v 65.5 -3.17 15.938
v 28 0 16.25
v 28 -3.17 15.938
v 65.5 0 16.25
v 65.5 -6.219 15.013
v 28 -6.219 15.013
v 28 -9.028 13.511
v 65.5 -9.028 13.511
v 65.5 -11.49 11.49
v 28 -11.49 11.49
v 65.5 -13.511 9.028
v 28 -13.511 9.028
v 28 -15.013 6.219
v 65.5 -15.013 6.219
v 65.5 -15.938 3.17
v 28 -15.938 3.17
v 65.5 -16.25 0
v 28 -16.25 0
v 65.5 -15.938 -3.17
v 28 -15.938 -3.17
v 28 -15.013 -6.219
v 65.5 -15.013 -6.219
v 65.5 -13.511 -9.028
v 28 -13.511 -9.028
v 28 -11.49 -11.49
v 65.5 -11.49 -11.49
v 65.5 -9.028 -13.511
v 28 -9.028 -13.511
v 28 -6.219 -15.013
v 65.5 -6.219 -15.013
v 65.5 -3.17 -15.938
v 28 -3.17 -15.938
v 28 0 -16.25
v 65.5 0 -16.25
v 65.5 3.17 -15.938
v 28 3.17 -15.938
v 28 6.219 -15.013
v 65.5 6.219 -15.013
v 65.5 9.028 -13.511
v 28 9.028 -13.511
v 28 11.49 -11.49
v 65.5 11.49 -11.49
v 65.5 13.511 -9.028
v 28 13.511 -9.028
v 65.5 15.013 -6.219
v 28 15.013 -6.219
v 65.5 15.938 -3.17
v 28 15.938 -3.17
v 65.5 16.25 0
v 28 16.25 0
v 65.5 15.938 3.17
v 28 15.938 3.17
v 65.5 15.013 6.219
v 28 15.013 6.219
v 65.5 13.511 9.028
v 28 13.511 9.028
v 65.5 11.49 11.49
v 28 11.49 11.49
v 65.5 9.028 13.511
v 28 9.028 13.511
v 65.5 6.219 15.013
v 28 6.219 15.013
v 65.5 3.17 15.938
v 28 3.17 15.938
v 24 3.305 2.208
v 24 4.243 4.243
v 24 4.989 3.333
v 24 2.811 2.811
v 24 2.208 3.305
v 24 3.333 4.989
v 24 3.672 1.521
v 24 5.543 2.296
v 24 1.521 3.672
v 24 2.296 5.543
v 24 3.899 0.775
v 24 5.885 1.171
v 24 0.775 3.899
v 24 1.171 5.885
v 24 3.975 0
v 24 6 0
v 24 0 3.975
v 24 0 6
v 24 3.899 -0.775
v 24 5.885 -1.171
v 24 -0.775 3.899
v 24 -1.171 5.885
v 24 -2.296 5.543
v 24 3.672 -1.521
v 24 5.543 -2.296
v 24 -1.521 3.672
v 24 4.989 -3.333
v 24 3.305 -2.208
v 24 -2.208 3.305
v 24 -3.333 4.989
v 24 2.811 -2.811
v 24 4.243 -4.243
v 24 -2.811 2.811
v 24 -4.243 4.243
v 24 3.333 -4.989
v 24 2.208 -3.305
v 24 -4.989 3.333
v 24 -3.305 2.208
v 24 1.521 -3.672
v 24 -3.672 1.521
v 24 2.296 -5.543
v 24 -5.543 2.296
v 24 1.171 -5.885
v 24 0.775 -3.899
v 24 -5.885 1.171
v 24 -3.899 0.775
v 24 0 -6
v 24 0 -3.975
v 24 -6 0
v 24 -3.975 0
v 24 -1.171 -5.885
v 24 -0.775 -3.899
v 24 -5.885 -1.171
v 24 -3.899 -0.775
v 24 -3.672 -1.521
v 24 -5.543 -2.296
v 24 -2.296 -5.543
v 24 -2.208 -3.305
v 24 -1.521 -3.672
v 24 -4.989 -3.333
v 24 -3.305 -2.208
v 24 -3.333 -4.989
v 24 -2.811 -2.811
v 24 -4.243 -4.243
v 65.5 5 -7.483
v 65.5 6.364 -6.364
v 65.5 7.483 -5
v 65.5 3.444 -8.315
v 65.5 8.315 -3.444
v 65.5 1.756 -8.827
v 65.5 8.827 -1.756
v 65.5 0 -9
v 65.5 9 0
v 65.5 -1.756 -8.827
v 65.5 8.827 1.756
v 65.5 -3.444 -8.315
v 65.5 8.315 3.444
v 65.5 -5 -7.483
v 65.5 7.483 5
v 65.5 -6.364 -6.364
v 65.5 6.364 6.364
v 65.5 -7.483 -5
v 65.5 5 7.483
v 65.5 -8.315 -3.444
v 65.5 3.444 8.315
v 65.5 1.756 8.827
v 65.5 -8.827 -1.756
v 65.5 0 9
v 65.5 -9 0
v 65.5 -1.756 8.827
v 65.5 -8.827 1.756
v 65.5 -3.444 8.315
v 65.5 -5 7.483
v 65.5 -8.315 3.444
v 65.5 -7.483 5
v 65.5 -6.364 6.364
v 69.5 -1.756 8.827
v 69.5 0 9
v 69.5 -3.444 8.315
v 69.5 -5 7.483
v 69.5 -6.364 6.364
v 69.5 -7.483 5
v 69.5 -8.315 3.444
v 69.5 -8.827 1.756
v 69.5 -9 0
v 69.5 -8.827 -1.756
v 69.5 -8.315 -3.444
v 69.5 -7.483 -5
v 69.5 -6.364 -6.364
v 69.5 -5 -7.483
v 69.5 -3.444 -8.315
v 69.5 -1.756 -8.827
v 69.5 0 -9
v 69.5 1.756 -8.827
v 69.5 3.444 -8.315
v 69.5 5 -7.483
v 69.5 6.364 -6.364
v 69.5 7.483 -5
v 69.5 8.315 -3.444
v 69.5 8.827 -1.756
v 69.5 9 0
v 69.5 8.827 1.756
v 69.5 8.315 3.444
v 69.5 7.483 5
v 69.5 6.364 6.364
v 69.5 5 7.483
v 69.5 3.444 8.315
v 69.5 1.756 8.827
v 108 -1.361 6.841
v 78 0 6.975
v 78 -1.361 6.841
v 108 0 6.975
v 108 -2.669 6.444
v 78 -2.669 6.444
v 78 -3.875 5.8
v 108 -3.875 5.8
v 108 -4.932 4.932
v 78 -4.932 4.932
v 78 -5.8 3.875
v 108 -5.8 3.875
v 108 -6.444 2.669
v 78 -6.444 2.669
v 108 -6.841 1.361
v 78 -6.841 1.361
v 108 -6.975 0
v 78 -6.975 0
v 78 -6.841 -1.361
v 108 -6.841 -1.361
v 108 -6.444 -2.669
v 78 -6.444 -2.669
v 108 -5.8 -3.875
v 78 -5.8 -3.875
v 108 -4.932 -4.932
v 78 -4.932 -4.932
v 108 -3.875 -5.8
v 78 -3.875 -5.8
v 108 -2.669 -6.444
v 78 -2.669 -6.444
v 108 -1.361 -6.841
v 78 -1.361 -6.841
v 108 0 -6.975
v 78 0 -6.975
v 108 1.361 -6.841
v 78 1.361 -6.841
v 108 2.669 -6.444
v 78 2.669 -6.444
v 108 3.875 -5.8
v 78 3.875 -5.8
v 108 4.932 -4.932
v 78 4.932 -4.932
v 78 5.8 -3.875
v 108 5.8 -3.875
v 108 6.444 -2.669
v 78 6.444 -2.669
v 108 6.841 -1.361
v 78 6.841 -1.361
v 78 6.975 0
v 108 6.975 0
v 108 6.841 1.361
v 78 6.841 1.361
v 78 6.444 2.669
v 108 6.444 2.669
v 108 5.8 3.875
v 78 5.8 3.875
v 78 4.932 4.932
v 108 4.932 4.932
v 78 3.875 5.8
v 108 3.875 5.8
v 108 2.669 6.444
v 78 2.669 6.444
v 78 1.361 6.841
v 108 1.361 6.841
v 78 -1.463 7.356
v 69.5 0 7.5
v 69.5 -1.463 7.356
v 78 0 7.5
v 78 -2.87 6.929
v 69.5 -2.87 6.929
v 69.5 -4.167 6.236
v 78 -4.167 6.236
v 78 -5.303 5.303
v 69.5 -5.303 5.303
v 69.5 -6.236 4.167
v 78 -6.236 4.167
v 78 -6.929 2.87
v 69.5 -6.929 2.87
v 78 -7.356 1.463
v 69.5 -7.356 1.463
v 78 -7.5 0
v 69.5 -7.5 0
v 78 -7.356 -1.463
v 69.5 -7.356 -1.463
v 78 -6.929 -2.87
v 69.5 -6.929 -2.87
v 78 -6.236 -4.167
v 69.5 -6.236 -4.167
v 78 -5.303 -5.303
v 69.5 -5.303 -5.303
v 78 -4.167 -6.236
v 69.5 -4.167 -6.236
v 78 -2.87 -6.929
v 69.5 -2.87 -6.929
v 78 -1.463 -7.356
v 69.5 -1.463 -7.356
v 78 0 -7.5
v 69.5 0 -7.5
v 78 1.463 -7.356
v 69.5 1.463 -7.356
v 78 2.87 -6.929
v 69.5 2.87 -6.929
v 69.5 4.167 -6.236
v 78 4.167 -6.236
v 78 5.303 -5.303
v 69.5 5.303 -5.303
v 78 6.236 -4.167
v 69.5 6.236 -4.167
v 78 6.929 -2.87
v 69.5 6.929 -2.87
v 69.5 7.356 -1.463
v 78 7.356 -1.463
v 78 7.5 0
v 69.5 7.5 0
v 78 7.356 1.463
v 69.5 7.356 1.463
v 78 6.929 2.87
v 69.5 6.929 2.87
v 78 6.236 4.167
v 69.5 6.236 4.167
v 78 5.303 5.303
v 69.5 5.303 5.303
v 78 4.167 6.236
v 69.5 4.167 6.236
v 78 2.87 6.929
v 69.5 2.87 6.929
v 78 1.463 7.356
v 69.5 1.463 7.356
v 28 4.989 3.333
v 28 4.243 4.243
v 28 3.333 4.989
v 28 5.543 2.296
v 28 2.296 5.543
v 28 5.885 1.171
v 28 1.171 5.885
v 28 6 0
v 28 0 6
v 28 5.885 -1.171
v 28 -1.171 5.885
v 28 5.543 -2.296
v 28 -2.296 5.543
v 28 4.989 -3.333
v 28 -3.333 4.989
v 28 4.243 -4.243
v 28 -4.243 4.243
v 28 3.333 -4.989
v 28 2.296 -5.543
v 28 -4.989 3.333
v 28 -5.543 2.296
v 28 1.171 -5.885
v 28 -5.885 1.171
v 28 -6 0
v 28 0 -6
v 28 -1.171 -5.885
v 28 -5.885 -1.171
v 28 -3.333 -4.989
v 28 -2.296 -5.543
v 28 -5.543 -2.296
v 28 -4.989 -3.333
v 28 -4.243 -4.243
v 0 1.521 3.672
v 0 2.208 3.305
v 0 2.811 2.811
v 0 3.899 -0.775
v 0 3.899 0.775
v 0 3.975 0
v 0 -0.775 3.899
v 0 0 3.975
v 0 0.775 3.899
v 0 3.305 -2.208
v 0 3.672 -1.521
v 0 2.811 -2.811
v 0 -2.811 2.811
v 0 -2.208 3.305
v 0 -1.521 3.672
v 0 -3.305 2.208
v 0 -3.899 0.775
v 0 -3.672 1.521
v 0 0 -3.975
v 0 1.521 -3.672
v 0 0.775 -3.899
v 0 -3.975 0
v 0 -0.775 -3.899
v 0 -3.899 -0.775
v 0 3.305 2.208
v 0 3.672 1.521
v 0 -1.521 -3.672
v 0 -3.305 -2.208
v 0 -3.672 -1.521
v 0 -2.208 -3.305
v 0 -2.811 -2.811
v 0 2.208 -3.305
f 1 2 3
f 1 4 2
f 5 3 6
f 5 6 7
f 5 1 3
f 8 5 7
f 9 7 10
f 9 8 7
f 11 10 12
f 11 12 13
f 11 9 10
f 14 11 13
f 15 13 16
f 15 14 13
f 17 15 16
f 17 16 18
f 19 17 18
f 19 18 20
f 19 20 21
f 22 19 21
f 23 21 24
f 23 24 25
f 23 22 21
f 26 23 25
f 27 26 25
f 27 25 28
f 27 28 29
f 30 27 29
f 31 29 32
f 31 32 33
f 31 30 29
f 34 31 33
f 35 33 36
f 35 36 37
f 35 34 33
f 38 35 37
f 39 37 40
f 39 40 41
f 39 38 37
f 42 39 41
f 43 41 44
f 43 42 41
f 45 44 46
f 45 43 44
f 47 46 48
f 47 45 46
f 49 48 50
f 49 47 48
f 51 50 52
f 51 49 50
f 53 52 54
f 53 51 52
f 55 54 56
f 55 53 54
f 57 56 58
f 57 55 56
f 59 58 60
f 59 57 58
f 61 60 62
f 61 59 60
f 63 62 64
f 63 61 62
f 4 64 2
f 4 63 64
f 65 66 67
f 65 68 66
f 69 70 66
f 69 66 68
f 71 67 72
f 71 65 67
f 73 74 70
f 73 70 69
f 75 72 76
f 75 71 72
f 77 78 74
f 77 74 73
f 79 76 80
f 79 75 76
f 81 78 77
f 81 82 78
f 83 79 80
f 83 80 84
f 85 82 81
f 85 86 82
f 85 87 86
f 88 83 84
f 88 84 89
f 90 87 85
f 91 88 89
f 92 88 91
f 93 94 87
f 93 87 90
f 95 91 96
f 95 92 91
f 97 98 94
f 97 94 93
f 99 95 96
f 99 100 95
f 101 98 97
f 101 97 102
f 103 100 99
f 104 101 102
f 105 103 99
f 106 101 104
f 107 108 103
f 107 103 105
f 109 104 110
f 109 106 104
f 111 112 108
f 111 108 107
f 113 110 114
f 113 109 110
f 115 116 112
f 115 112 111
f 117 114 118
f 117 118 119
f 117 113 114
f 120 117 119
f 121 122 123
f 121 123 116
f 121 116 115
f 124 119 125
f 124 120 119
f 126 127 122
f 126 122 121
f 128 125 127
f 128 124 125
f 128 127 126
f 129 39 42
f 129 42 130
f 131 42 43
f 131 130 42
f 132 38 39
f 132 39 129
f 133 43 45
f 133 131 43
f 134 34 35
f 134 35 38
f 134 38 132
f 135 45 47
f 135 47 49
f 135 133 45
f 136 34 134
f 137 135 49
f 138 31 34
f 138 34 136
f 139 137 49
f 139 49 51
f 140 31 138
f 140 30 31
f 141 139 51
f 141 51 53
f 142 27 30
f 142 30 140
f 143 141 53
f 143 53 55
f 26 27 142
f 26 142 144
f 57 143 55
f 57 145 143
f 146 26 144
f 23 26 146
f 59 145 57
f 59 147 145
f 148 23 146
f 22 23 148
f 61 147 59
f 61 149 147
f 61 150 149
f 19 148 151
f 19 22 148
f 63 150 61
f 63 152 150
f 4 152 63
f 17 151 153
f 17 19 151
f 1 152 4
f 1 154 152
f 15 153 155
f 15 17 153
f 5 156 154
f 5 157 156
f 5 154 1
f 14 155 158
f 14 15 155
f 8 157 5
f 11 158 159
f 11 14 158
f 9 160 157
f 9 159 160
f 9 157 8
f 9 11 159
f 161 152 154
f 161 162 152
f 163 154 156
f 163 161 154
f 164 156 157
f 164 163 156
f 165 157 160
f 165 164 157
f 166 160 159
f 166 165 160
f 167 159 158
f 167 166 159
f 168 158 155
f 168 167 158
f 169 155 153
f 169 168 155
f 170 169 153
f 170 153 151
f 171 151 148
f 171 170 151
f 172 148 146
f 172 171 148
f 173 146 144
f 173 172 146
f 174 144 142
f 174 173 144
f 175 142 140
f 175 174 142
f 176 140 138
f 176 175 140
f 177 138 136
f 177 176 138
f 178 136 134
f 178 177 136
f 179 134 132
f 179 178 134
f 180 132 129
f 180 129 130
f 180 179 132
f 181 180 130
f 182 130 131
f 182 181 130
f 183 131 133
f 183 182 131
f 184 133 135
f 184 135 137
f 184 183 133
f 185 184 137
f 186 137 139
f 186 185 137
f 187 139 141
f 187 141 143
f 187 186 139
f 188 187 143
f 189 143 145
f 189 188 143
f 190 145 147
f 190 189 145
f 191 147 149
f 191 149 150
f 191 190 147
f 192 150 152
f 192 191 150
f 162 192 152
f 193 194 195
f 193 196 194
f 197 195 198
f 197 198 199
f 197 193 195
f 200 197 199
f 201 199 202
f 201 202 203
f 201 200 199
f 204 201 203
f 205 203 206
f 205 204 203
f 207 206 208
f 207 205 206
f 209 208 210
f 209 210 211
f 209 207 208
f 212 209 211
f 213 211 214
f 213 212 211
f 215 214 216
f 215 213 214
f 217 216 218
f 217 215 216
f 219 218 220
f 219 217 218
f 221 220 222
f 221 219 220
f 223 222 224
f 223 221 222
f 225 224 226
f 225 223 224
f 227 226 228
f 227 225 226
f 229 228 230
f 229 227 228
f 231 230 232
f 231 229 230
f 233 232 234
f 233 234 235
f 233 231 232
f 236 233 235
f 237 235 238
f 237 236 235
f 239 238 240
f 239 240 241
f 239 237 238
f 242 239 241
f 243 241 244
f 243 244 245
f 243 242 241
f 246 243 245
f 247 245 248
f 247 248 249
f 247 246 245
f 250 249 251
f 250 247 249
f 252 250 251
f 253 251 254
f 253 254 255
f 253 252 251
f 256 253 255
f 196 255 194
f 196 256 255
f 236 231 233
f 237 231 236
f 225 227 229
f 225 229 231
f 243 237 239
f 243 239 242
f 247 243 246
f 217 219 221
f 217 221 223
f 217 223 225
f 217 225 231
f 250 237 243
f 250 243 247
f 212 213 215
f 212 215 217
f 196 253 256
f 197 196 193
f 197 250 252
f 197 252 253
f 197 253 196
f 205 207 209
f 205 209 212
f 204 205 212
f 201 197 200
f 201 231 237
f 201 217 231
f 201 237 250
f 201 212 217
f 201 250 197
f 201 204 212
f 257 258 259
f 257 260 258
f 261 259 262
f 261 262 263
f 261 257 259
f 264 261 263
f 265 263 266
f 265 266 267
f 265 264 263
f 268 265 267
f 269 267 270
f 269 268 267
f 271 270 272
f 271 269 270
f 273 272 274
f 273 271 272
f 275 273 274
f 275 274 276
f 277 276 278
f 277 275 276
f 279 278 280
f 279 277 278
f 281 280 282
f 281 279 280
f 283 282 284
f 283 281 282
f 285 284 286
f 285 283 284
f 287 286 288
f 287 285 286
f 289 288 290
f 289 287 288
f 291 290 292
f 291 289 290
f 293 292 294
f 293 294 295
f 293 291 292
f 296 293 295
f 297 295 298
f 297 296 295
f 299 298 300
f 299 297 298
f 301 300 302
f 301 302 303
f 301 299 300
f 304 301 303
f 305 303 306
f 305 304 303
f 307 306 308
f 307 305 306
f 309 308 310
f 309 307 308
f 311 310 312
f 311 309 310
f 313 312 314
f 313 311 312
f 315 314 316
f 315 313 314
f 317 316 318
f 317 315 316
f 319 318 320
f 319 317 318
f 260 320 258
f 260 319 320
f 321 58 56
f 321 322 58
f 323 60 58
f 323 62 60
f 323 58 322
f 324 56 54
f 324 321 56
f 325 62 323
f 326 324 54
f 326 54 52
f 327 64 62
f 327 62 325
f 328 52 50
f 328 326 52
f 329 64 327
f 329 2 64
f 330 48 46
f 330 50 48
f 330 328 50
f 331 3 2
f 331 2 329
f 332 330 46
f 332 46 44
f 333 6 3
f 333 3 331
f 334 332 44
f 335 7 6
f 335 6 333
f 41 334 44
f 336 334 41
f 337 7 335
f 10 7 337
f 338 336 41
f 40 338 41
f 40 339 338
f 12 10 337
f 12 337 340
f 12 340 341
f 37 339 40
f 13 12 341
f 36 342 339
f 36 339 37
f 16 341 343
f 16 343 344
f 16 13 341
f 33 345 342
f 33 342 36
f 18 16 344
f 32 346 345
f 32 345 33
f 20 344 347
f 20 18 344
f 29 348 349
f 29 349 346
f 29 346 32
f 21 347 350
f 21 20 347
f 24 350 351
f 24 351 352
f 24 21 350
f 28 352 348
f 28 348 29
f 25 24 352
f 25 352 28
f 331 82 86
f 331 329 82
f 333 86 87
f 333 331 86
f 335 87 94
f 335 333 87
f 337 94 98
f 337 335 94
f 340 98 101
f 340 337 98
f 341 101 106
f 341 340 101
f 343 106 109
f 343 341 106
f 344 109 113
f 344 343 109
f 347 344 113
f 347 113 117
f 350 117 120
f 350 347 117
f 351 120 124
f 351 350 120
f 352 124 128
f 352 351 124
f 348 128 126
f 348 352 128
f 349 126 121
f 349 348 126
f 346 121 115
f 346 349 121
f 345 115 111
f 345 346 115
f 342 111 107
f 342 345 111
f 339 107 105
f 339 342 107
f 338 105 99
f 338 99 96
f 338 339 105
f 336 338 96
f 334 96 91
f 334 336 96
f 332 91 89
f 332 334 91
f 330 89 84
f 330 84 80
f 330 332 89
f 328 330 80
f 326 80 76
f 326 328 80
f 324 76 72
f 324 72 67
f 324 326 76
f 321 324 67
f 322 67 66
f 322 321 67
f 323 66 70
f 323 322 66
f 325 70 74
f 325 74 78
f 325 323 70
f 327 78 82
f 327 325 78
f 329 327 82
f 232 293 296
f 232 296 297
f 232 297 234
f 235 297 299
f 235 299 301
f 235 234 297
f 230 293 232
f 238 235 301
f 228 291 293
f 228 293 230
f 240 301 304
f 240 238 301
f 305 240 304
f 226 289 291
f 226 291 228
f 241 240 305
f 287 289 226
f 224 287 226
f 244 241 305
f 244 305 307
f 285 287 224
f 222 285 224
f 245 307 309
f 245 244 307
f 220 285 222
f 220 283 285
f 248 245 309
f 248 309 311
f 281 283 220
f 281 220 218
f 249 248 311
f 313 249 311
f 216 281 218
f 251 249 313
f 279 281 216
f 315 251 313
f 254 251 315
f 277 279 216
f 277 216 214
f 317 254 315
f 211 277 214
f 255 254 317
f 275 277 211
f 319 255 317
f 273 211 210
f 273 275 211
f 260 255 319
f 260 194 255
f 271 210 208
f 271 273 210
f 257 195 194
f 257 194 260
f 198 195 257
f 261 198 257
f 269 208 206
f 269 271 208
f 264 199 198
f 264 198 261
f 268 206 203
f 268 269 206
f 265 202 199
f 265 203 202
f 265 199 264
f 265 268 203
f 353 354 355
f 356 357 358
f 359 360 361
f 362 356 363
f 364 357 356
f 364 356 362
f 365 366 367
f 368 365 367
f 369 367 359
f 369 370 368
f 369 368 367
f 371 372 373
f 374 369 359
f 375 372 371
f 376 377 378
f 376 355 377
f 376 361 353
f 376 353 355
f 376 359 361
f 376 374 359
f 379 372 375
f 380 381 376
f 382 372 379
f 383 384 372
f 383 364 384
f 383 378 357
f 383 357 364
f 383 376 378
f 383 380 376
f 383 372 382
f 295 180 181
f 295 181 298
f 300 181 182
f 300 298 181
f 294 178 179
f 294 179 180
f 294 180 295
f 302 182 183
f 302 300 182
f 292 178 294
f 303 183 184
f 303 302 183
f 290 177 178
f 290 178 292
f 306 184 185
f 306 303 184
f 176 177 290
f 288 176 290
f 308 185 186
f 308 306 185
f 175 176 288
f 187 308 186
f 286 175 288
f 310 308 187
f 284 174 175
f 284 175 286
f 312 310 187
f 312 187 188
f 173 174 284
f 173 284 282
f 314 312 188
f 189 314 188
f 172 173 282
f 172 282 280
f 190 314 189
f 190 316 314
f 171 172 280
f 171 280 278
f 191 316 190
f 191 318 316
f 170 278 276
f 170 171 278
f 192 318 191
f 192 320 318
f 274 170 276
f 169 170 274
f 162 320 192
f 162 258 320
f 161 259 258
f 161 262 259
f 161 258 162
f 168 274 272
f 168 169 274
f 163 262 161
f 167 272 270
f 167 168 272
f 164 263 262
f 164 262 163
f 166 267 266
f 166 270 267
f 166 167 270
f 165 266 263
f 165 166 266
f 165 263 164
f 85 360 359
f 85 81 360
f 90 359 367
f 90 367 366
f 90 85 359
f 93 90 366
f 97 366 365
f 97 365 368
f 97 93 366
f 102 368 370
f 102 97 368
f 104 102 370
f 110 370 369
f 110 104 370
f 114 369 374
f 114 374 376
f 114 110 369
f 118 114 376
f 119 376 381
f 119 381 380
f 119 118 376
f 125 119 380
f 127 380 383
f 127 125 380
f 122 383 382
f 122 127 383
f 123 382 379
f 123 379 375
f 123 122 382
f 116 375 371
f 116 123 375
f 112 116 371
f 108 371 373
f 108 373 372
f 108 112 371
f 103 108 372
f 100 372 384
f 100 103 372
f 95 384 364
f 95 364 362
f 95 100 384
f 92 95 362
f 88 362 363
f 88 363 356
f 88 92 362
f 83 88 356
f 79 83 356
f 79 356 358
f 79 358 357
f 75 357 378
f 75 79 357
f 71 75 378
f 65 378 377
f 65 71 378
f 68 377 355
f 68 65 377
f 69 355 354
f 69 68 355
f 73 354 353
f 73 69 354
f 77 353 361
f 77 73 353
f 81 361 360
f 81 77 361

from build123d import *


with BuildPart() as part:
    # Çizim1 → Döndür1 (revolve)
    with BuildSketch(Plane.XY, mode=Mode.PRIVATE) as d_nd_r1_sk:
        Polygon((0, 0), (0, 3.975), (24, 3.975), (24, 6), (28, 6), (28, 16.25), (65.5, 16.25), (65.5, 9), (69.5, 9), (69.5, 7.5), (78, 7.5), (78, 6.975), (108, 6.975), (108, 0), align=None)
    revolve(d_nd_r1_sk.sketch.rotate(Axis((0, 0, 0), (1, 0, 0)), 90), axis=Axis((0, 0, 0), (1, 0, 0)))


solid = part.part
